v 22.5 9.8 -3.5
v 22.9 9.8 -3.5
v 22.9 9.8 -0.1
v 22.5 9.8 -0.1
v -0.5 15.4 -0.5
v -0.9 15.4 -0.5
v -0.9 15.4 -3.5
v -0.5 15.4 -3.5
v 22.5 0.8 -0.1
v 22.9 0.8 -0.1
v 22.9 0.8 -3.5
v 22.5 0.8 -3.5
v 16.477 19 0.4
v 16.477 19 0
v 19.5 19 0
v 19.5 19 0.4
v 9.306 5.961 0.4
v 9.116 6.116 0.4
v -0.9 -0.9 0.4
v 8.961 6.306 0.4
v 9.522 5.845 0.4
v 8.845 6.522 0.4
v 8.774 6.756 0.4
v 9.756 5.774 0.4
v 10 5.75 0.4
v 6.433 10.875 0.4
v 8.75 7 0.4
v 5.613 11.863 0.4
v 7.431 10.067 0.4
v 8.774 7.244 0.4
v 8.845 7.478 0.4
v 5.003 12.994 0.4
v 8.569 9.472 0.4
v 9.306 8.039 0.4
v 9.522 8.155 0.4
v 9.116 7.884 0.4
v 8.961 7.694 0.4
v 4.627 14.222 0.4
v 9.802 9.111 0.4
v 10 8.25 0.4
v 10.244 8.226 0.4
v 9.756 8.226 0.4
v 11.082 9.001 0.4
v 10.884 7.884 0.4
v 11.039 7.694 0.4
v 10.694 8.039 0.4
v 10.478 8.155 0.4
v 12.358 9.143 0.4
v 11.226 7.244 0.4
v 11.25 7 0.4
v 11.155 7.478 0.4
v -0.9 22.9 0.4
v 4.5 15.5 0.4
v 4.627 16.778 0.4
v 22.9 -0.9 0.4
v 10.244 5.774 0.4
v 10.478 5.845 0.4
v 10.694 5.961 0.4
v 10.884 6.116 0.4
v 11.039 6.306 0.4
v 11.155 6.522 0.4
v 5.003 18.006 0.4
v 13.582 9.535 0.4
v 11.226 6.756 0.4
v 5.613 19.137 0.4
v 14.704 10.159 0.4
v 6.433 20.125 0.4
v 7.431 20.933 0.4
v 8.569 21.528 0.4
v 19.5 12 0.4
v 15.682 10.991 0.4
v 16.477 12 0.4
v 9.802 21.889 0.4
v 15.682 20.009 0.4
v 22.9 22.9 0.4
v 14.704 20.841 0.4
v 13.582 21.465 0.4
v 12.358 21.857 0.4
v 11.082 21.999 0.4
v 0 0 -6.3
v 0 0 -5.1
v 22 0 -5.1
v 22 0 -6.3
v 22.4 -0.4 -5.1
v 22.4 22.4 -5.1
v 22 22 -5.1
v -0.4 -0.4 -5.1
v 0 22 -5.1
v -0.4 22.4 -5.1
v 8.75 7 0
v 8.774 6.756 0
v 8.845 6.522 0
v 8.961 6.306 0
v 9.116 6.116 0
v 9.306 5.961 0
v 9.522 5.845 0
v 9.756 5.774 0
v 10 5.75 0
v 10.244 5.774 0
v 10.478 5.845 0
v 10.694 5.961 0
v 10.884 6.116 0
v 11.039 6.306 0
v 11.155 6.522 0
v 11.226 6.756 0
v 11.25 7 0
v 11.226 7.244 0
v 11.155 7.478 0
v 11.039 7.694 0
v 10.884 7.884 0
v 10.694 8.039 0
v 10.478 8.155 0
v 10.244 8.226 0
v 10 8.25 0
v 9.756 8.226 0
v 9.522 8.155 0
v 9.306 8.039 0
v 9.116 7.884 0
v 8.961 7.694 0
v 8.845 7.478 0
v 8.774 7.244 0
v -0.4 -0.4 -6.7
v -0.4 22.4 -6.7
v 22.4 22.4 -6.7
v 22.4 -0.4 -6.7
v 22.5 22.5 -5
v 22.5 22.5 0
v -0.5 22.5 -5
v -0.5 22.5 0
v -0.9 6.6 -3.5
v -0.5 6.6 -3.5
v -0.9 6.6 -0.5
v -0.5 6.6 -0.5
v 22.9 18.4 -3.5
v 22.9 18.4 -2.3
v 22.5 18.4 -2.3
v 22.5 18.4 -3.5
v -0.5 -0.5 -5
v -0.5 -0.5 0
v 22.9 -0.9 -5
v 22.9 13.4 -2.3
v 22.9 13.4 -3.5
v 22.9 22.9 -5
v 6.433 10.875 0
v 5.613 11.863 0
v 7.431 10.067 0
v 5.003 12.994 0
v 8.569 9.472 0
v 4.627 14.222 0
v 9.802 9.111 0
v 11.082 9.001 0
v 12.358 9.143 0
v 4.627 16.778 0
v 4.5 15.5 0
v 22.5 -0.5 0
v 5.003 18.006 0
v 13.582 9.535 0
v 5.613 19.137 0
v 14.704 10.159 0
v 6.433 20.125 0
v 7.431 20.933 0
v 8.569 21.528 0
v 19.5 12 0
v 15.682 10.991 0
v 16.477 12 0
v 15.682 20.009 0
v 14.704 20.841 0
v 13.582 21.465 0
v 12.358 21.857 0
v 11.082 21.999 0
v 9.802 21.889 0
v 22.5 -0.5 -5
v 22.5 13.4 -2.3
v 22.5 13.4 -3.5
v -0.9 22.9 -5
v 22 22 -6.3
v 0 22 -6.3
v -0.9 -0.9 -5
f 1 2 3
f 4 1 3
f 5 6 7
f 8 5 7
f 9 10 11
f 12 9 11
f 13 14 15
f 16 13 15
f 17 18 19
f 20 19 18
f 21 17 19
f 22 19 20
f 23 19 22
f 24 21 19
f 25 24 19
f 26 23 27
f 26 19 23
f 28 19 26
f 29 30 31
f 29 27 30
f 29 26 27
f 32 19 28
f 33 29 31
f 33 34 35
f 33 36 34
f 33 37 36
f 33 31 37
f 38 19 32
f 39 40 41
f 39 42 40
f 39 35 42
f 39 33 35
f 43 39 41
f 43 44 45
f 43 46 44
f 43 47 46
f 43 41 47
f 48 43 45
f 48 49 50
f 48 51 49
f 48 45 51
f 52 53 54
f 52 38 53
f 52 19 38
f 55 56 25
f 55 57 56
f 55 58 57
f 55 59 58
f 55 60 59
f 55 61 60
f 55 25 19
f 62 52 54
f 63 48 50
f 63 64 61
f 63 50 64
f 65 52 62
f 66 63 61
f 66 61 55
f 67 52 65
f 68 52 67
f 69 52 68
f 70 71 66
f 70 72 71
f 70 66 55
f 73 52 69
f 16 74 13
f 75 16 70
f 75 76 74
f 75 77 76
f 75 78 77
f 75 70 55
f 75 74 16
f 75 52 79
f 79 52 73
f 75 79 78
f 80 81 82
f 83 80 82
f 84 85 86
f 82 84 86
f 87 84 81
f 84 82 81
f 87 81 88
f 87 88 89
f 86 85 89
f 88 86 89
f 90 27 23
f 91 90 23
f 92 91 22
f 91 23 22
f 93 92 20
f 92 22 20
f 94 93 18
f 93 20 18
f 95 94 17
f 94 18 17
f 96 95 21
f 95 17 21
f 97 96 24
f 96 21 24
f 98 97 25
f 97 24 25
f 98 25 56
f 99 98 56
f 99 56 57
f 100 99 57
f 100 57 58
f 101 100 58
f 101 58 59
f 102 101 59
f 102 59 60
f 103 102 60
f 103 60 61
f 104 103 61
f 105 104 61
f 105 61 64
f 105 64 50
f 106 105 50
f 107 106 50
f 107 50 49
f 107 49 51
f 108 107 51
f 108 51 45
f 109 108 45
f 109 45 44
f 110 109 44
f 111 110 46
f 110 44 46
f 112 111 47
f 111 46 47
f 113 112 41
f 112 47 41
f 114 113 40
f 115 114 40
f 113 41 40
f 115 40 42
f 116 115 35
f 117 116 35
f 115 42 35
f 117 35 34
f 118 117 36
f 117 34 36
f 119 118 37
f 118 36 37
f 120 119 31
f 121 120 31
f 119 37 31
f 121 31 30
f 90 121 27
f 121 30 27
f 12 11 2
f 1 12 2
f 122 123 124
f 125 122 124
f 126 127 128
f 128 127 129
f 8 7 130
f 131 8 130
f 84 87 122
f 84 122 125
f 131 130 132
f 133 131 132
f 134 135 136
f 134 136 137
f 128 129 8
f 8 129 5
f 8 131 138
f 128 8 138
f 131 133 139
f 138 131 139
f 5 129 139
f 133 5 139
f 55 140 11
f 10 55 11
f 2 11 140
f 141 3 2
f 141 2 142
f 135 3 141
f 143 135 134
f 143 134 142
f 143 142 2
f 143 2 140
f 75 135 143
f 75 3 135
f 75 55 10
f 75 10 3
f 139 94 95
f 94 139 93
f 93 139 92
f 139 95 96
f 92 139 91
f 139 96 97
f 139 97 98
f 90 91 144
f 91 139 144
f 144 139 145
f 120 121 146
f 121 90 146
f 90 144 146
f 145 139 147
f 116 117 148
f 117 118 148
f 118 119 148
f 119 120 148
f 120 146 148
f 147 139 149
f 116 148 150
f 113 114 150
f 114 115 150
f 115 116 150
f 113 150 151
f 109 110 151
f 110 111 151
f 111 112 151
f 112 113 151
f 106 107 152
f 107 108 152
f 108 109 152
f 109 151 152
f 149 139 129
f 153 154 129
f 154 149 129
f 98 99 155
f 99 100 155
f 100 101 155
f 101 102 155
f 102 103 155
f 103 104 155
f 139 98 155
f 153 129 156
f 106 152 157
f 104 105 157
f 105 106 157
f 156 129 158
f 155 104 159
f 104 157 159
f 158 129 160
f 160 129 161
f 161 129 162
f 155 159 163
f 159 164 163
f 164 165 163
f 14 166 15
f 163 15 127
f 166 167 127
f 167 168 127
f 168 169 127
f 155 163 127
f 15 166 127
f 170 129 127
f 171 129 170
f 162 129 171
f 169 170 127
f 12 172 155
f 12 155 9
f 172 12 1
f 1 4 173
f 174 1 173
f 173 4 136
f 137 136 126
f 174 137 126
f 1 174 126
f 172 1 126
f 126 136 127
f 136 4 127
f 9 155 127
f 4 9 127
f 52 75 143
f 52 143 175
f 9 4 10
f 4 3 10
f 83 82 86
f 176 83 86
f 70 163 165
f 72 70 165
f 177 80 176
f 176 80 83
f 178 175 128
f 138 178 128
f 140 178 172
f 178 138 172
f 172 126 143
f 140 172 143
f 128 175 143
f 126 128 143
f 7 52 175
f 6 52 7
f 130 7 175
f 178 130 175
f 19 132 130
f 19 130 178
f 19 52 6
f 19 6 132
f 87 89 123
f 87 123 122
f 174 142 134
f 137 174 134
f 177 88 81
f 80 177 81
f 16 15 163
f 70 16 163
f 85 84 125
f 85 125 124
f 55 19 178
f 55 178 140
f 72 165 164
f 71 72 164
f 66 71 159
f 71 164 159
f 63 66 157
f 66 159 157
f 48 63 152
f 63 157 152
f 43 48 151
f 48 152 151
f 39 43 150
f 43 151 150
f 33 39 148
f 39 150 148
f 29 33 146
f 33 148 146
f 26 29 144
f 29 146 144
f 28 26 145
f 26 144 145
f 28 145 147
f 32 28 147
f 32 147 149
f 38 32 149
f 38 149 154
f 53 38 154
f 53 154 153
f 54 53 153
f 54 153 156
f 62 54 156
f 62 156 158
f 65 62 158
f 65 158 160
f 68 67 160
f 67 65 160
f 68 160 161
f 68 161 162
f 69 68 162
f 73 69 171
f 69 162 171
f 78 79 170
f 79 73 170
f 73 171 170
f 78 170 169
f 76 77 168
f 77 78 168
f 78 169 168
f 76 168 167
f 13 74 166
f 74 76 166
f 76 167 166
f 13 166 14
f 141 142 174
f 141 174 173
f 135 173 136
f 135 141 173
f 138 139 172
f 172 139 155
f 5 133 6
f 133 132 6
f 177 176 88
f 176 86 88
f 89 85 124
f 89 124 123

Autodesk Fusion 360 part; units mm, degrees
sketch "Sketch1" plane through (0, 0, 0) normal (0, 0, 1) x (1, 0, 0)
  line L0 (0, 0) -> (22, 0) construction
  line L1 (22, 0) -> (22, 22) construction
  line L2 (22, 22) -> (0, 22) construction
  line L3 (0, 22) -> (0, 0) construction
  line L4 (22.4, -0.4) -> (22.4, 22.4) construction
  line L5 (22.4, 22.4) -> (-0.4, 22.4) construction
  line L6 (-0.4, 22.4) -> (-0.4, -0.4) construction
  line L7 (-0.4, -0.4) -> (22.4, -0.4) construction
  circle A0 centre (11, 15.5) radius 6.5
  line L8 (16.4772, 19) -> (19.5, 19)
  line L9 (19.5, 19) -> (19.5, 12)
  line L10 (19.5, 12) -> (16.4772, 12)
  line L11 (16.4772, 12) -> (16.4772, 19)
  line L12 (-0.5, 22.5) -> (-0.5, -0.5)
  line L13 (-0.5, -0.5) -> (22.5, -0.5)
  line L14 (22.5, -0.5) -> (22.5, 22.5)
  line L15 (22.5, 22.5) -> (-0.5, 22.5)
  line L16 (-0.9, -0.9) -> (22.9, -0.9)
  line L17 (22.9, -0.9) -> (22.9, 22.9)
  line L18 (22.9, 22.9) -> (-0.9, 22.9)
  line L19 (-0.9, 22.9) -> (-0.9, -0.9)
  dimension "d1" = 22
  dimension "d2" = 22
  dimension "d3" = 0.4
  dimension "d4" = 13
  dimension "d5" = 11
  dimension "d6" = 8.5
  dimension "d7" = 7
  dimension "d37" = 0.5
  dimension "d38" = 0.9
extrude "Extrude1" add sketch "Sketch1" along normal blind 0.4 contours L12 L13 L14 L15 | L16 L17 L18 L19 makes body 1
extrude "Extrude2" add sketch "Sketch1" against normal blind 5 contours L16 L17 L18 L19 bodies 1
sketch "Sketch2" plane through (-0.9, 0, 0) normal (-1, 0, 0) x (0, -1, 0)
  line L0 (0.4, -3.5) -> (0.4, 0)
  line L1 (-22.4, 0) -> (-22.4, -3.5)
  line L2 (-22.4, -3.5) -> (0.4, -3.5)
  line L3 (-15.4, -3.5) -> (-6.6, -3.5)
  line L4 (-6.6, -3.5) -> (-6.6, -0.5)
  line L5 (-6.6, -0.5) -> (-15.4, -0.5)
  line L6 (-15.4, -0.5) -> (-15.4, -3.5)
  line L7 (0.4, 0) -> (-22.4, 0)
  line L8 (0.9, -5) -> (0.9, 0.4)
  line L9 (0.9, 0.4) -> (-22.9, 0.4)
  line L10 (-22.9, 0.4) -> (-22.9, -5)
  line L11 (-22.9, -5) -> (0.9, -5)
  dimension "d12" = 7
  dimension "d13" = 7
  dimension "d14" = 3
extrude "Extrude3" cut sketch "Sketch2" against normal blind 0.4 contours L2 L3 L4 L5 L6 bodies 1
sketch "Sketch3" plane through (22.9, 0, 0) normal (1, 0, 0) x (0, 1, 0)
  line L0 (22.4, -3.5) -> (22.4, 0)
  line L1 (-0.4, 0) -> (-0.4, -3.5)
  line L2 (-0.4, -3.5) -> (22.4, -3.5)
  line L3 (0.8, -3.5) -> (9.8, -3.5)
  line L4 (9.8, -3.5) -> (9.8, -0.1)
  line L5 (9.8, -0.1) -> (0.8, -0.1)
  line L6 (0.8, -0.1) -> (0.8, -3.5)
  line L7 (22.4, 0) -> (-0.4, 0)
  line L8 (22.9, -5) -> (22.9, 0.4)
  line L9 (22.9, 0.4) -> (-0.9, 0.4)
  line L10 (-0.9, 0.4) -> (-0.9, -5)
  line L11 (-0.9, -5) -> (22.9, -5)
  dimension "d17" = 9
  dimension "d18" = 3.4
  dimension "d19" = 1.2
extrude "Extrude4" cut sketch "Sketch3" against normal up to surface (0.4 mm away) contours L2 L3 L4 L5 L6 bodies 1
sketch "Sketch4" plane through (22.9, 0, 0) normal (1, 0, 0) x (0, 1, 0)
  line L0 (9.8, -0.1) -> (9.8, -3.5)
  line L1 (9.8, -3.5) -> (22.4, -3.5)
  line L2 (22.4, -3.5) -> (22.4, 0)
  line L3 (-0.4, 0) -> (-0.4, -3.5)
  line L4 (-0.4, -3.5) -> (0.8, -3.5)
  line L5 (0.8, -3.5) -> (0.8, -0.1)
  line L6 (0.8, -0.1) -> (9.8, -0.1)
  line L7 (18.4, -3.5) -> (13.4, -3.5)
  line L8 (13.4, -3.5) -> (13.4, -2.3)
  line L9 (13.4, -2.3) -> (18.4, -2.3)
  line L10 (18.4, -2.3) -> (18.4, -3.5)
  line L11 (22.4, 0) -> (-0.4, 0)
  line L12 (9.8, -0.1) -> (9.8, -3.5)
  line L13 (-0.9, -5) -> (22.9, -5)
  line L14 (22.9, -5) -> (22.9, 0.4)
  line L15 (22.9, 0.4) -> (-0.9, 0.4)
  line L16 (-0.9, 0.4) -> (-0.9, -5)
  line L17 (0.8, -3.5) -> (0.8, -0.1)
  line L18 (0.8, -0.1) -> (9.8, -0.1)
  line L19 (9.8, -3.5) -> (0.8, -3.5)
  dimension "d22" = 4
  dimension "d23" = 5
  dimension "d24" = 1.2
extrude "Extrude5" cut sketch "Sketch4" against normal up to surface (0.4 mm away) contours L1 L7 L8 L9 L10 bodies 1
ref_plane "WorkPlane1" through (11, 11, -5.1) normal (0, 0, -1) x (-1, 0, 0)
sketch "Sketch5" plane through (11, 11, -5.1) normal (0, 0, -1) x (-1, 0, 0)
  line L0 (-11, -11) -> (-11, 11)
  line L1 (-11, 11) -> (11, 11)
  line L2 (-11.4, 11.4) -> (11.4, 11.4)
  line L3 (-11.4, -11.4) -> (-11.4, 11.4)
  line L4 (11.4, 11.4) -> (11.4, -11.4)
  line L5 (11, 11) -> (11, -11)
  line L6 (11, -11) -> (-11, -11)
  line L7 (11.4, -11.4) -> (-11.4, -11.4)
extrude "Extrude6" add sketch "Sketch5" along normal blind 1.2 separate body makes body 2
sketch "Sketch6" plane through (0, 0, -6.3) normal (0, 0, -1) x (1, 0, 0)
  line L0 (0, -22) -> (0, 0)
  line L1 (0, 0) -> (22, 0)
  line L2 (22, 0) -> (22, -22)
  line L3 (22, -22) -> (0, -22)
  line L4 (-0.4, 0.4) -> (-0.4, -22.4)
  line L5 (-0.4, -22.4) -> (22.4, -22.4)
  line L6 (22.4, -22.4) -> (22.4, 0.4)
  line L7 (22.4, 0.4) -> (-0.4, 0.4)
extrude "Extrude7" add sketch "Sketch6" along normal blind 0.4 contours L0 L1 L2 L3 | L4 L5 L6 L7 bodies 2
sketch "Sketch7" plane through (0, 0, 0.4) normal (0, 0, 1) x (-1, 0, 0)
  arc A0 (-16.4772, -19) -> (-16.4772, -12) centre (-11, -15.5) ccw
  line L0 (-16.4772, -19) -> (-19.5, -19)
  line L1 (-19.5, -19) -> (-19.5, -12)
  line L2 (-19.5, -12) -> (-16.4772, -12)
  circle A1 centre (-10, -7) radius 1.25
  line L3 (0.9, -22.9) -> (0.9, 0.9)
  line L4 (0.9, 0.9) -> (-22.9, 0.9)
  line L5 (-22.9, 0.9) -> (-22.9, -22.9)
  line L6 (-22.9, -22.9) -> (0.9, -22.9)
  dimension "d34" = 2.5
extrude "Extrude8" cut sketch "Sketch7" against normal up to surface (0.4 mm away) contours A1 bodies 1
